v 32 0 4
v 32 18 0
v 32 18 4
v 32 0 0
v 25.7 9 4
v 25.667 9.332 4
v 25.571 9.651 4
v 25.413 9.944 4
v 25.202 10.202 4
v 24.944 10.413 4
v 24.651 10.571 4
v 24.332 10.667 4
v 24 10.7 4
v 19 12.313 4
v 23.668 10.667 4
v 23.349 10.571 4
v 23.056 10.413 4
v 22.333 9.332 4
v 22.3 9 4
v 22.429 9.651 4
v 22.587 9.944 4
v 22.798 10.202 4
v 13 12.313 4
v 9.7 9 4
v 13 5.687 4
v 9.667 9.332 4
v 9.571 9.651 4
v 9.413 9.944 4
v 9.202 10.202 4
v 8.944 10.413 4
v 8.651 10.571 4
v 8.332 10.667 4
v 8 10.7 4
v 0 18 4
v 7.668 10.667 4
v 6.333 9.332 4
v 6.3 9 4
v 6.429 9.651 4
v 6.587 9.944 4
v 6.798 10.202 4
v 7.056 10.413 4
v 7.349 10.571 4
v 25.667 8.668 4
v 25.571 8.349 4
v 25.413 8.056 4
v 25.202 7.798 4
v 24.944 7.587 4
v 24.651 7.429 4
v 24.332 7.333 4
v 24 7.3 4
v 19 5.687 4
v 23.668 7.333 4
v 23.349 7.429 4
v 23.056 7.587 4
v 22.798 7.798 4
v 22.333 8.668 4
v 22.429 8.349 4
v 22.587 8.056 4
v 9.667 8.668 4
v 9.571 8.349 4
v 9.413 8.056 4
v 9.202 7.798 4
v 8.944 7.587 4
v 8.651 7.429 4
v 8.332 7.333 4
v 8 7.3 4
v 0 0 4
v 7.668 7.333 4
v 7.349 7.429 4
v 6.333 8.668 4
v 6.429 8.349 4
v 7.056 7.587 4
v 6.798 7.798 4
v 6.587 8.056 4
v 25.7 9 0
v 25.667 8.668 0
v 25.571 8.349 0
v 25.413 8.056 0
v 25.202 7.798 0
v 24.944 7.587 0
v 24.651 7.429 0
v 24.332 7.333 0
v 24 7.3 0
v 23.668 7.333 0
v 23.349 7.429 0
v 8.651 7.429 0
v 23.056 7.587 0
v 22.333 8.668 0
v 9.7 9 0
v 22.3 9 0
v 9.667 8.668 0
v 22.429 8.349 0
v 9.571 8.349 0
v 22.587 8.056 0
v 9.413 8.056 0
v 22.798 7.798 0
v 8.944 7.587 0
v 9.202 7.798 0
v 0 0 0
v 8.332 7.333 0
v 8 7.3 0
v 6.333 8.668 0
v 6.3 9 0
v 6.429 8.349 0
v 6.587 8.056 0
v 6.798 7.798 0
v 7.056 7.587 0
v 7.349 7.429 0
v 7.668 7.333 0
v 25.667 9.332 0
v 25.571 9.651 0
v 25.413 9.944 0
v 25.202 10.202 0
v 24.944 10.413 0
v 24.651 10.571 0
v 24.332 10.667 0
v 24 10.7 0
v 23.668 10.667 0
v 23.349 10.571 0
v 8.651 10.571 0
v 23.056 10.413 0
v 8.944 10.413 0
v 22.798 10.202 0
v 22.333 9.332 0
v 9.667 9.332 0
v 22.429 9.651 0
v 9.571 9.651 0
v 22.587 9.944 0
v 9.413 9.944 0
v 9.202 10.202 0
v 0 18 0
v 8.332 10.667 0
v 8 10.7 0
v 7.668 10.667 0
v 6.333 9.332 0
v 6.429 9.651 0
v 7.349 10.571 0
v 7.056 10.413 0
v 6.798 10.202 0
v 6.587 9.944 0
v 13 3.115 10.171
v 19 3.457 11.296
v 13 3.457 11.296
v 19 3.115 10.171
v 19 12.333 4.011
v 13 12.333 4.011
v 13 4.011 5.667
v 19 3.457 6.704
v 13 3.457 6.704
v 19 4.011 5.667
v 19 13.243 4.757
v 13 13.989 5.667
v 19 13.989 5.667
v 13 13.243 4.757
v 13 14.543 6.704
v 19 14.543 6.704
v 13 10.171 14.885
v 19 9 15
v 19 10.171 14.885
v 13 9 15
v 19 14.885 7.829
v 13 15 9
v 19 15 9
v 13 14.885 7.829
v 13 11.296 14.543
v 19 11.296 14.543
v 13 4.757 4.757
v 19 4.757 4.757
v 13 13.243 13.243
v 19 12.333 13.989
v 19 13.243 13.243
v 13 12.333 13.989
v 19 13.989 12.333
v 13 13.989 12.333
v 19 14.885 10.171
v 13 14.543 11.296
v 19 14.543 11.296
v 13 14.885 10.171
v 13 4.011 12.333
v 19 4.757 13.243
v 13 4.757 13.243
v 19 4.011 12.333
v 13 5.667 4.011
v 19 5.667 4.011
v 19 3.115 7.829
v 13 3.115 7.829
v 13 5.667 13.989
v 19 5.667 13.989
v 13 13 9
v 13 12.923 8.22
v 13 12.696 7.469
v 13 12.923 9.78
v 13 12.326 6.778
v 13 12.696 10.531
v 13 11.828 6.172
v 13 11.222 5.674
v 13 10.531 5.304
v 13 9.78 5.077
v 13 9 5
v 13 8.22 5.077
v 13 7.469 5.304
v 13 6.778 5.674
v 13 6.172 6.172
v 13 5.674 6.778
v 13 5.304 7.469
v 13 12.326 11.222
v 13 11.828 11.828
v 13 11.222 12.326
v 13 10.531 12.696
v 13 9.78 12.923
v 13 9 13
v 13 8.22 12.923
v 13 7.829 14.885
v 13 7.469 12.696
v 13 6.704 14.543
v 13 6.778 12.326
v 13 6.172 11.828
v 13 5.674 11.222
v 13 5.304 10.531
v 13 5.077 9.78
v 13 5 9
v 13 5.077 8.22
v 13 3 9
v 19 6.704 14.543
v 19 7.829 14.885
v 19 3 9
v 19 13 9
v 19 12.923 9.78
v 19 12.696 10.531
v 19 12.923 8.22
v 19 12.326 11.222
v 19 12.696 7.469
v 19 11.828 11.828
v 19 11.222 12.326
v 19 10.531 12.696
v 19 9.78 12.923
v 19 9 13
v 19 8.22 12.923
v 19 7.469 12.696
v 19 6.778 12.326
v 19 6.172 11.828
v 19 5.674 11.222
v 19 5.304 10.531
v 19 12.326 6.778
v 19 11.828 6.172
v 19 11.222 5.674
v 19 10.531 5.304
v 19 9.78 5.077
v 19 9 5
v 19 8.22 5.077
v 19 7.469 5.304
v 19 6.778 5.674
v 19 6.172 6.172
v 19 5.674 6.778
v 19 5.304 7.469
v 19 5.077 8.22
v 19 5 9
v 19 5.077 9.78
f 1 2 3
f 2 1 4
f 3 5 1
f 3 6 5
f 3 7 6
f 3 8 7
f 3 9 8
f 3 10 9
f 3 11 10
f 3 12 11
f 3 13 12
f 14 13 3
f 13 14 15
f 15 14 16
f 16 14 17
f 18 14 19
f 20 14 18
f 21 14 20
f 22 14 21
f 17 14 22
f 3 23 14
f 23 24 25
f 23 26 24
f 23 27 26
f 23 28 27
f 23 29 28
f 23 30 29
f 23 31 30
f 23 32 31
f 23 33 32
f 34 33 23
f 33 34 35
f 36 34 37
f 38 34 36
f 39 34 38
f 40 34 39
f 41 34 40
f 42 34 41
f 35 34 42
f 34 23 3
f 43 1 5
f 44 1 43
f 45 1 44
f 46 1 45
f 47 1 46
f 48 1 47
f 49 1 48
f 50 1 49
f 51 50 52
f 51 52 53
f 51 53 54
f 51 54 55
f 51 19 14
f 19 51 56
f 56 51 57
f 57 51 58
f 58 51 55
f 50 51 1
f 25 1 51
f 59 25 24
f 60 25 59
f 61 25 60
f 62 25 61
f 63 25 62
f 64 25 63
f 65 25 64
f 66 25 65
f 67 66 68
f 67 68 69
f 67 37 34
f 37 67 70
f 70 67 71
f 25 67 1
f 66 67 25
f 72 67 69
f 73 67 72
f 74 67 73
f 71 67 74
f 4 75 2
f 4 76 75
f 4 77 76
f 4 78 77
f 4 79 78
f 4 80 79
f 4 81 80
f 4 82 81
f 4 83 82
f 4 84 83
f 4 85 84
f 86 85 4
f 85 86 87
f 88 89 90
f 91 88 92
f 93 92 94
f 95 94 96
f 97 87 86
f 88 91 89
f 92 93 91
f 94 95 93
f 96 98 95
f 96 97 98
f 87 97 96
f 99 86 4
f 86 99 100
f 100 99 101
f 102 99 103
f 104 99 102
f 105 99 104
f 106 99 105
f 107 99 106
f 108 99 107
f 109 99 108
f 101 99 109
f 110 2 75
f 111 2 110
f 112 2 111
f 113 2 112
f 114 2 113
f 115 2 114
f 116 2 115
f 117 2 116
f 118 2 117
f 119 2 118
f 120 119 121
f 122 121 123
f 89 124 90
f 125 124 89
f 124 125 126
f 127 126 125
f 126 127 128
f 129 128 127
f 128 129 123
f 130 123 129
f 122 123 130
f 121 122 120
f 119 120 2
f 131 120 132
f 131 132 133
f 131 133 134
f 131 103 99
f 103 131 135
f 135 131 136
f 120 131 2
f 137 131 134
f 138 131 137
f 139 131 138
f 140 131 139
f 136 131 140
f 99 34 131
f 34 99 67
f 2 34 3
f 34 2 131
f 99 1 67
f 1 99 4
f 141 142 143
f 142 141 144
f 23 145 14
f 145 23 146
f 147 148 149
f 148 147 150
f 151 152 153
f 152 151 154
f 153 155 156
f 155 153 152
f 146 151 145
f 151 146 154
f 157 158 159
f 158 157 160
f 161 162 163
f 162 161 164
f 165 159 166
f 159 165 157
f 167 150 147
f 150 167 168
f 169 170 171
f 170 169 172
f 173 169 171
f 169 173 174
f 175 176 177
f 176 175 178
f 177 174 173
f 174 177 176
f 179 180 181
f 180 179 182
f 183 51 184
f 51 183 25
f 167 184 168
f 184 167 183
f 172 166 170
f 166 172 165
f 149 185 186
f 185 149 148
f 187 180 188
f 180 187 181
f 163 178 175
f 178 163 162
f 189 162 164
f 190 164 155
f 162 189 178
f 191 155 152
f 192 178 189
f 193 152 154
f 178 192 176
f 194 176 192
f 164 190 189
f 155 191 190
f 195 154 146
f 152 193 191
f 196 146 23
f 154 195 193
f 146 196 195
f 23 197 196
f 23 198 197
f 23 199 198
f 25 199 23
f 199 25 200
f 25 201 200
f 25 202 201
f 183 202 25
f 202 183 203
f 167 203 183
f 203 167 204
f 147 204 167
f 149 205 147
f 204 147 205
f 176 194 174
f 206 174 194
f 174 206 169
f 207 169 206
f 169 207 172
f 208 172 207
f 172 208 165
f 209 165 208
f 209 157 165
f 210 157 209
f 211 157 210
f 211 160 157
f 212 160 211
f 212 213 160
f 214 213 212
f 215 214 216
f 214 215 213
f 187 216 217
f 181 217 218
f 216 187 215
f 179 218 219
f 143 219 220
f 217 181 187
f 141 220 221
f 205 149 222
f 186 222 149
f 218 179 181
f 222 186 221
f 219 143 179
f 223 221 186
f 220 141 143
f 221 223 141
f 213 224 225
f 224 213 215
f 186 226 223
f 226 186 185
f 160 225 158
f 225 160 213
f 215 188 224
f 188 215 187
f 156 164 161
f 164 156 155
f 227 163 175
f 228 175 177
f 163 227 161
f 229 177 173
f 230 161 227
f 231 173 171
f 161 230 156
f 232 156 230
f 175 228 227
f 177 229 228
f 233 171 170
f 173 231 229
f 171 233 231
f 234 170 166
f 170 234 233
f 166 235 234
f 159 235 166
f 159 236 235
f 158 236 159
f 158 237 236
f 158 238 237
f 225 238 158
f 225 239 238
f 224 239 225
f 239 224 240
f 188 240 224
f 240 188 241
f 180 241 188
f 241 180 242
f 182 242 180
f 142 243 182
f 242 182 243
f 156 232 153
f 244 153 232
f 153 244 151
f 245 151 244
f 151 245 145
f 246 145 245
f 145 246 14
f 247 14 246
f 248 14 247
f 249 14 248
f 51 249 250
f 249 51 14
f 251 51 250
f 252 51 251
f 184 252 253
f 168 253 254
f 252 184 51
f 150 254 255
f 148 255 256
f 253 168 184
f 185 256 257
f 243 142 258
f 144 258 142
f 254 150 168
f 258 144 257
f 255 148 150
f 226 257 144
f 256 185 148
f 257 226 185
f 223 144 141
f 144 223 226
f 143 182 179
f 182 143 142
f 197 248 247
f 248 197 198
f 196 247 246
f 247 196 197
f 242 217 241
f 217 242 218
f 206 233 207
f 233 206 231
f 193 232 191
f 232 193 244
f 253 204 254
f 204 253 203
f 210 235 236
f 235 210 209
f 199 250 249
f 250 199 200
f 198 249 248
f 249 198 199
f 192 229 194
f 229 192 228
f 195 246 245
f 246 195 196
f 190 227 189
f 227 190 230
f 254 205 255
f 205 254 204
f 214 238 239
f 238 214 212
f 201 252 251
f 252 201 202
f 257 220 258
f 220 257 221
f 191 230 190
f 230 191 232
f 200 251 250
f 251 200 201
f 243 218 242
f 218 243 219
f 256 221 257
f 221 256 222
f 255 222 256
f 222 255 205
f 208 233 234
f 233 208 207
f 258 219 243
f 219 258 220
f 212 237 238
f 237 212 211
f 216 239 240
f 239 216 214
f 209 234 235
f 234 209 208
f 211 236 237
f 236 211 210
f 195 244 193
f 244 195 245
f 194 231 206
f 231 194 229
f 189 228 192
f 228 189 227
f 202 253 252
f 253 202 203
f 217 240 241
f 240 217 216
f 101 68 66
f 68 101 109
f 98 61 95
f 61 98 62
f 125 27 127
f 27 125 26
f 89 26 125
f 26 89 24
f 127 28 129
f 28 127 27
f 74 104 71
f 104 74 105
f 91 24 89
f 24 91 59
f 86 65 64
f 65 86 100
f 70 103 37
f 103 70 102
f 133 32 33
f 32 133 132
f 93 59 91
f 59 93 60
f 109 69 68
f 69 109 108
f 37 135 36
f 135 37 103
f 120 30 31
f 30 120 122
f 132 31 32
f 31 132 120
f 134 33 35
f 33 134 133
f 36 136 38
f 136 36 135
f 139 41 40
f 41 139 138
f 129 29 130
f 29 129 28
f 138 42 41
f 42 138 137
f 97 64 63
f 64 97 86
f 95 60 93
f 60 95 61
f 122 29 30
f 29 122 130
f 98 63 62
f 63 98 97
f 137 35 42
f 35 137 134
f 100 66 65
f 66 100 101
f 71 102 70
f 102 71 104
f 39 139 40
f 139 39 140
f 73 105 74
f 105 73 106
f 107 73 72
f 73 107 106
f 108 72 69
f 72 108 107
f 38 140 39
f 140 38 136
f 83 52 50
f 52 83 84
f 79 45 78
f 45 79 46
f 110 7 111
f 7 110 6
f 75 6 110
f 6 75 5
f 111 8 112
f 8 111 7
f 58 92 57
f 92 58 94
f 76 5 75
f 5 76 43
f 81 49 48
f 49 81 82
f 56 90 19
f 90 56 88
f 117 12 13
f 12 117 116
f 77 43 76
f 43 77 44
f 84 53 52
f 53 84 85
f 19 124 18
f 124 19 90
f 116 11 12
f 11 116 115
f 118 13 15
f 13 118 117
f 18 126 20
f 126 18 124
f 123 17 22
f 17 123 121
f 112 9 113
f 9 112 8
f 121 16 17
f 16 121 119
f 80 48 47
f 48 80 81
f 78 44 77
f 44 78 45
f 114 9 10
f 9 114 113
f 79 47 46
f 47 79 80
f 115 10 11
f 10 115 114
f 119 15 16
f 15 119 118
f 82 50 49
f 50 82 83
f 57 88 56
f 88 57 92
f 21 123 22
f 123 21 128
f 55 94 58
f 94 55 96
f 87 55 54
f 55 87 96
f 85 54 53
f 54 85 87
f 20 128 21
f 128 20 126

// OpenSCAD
$fn = 32;

// ----------------------------------------------------------------------
// Cable clip: cable 8 mm, clamp 12 mm, base 32 mm
// ----------------------------------------------------------------------

// --- parameters (mm) ---
plate_x = 32;             // base length, X
plate_y = 18;             // base width, Y
plate_t = 4;              // base thickness
wire_seat_d = 12;         // clamp outside diameter
clip_t = 2;               // clamp wall
cable_d = 8;              // cable opening
ring_w = 6;               // clamp width along the cable
screw_d = 3.4;            // screw clearance
sink = 1;                 // overlap of the clamp into the base

module base() {
  cube([plate_x, plate_y, plate_t]);
}

module clamp() {
  translate([plate_x / 2, plate_y / 2, plate_t + wire_seat_d / 2 - sink]) rotate([0, 90, 0])
    cylinder(h = ring_w, d = wire_seat_d, center = true);
}

difference() {
  union() {
    base();
    clamp();
  }
  translate([plate_x / 2, plate_y / 2, plate_t + wire_seat_d / 2 - sink]) rotate([0, 90, 0]) translate([0, 0, -ring_w / 2 - 1]) cylinder(h = ring_w + 2, d = cable_d);
  translate([8, plate_y / 2, -1]) cylinder(h = plate_t + 2, d = screw_d);
  translate([24, plate_y / 2, -1]) cylinder(h = plate_t + 2, d = screw_d);
}
